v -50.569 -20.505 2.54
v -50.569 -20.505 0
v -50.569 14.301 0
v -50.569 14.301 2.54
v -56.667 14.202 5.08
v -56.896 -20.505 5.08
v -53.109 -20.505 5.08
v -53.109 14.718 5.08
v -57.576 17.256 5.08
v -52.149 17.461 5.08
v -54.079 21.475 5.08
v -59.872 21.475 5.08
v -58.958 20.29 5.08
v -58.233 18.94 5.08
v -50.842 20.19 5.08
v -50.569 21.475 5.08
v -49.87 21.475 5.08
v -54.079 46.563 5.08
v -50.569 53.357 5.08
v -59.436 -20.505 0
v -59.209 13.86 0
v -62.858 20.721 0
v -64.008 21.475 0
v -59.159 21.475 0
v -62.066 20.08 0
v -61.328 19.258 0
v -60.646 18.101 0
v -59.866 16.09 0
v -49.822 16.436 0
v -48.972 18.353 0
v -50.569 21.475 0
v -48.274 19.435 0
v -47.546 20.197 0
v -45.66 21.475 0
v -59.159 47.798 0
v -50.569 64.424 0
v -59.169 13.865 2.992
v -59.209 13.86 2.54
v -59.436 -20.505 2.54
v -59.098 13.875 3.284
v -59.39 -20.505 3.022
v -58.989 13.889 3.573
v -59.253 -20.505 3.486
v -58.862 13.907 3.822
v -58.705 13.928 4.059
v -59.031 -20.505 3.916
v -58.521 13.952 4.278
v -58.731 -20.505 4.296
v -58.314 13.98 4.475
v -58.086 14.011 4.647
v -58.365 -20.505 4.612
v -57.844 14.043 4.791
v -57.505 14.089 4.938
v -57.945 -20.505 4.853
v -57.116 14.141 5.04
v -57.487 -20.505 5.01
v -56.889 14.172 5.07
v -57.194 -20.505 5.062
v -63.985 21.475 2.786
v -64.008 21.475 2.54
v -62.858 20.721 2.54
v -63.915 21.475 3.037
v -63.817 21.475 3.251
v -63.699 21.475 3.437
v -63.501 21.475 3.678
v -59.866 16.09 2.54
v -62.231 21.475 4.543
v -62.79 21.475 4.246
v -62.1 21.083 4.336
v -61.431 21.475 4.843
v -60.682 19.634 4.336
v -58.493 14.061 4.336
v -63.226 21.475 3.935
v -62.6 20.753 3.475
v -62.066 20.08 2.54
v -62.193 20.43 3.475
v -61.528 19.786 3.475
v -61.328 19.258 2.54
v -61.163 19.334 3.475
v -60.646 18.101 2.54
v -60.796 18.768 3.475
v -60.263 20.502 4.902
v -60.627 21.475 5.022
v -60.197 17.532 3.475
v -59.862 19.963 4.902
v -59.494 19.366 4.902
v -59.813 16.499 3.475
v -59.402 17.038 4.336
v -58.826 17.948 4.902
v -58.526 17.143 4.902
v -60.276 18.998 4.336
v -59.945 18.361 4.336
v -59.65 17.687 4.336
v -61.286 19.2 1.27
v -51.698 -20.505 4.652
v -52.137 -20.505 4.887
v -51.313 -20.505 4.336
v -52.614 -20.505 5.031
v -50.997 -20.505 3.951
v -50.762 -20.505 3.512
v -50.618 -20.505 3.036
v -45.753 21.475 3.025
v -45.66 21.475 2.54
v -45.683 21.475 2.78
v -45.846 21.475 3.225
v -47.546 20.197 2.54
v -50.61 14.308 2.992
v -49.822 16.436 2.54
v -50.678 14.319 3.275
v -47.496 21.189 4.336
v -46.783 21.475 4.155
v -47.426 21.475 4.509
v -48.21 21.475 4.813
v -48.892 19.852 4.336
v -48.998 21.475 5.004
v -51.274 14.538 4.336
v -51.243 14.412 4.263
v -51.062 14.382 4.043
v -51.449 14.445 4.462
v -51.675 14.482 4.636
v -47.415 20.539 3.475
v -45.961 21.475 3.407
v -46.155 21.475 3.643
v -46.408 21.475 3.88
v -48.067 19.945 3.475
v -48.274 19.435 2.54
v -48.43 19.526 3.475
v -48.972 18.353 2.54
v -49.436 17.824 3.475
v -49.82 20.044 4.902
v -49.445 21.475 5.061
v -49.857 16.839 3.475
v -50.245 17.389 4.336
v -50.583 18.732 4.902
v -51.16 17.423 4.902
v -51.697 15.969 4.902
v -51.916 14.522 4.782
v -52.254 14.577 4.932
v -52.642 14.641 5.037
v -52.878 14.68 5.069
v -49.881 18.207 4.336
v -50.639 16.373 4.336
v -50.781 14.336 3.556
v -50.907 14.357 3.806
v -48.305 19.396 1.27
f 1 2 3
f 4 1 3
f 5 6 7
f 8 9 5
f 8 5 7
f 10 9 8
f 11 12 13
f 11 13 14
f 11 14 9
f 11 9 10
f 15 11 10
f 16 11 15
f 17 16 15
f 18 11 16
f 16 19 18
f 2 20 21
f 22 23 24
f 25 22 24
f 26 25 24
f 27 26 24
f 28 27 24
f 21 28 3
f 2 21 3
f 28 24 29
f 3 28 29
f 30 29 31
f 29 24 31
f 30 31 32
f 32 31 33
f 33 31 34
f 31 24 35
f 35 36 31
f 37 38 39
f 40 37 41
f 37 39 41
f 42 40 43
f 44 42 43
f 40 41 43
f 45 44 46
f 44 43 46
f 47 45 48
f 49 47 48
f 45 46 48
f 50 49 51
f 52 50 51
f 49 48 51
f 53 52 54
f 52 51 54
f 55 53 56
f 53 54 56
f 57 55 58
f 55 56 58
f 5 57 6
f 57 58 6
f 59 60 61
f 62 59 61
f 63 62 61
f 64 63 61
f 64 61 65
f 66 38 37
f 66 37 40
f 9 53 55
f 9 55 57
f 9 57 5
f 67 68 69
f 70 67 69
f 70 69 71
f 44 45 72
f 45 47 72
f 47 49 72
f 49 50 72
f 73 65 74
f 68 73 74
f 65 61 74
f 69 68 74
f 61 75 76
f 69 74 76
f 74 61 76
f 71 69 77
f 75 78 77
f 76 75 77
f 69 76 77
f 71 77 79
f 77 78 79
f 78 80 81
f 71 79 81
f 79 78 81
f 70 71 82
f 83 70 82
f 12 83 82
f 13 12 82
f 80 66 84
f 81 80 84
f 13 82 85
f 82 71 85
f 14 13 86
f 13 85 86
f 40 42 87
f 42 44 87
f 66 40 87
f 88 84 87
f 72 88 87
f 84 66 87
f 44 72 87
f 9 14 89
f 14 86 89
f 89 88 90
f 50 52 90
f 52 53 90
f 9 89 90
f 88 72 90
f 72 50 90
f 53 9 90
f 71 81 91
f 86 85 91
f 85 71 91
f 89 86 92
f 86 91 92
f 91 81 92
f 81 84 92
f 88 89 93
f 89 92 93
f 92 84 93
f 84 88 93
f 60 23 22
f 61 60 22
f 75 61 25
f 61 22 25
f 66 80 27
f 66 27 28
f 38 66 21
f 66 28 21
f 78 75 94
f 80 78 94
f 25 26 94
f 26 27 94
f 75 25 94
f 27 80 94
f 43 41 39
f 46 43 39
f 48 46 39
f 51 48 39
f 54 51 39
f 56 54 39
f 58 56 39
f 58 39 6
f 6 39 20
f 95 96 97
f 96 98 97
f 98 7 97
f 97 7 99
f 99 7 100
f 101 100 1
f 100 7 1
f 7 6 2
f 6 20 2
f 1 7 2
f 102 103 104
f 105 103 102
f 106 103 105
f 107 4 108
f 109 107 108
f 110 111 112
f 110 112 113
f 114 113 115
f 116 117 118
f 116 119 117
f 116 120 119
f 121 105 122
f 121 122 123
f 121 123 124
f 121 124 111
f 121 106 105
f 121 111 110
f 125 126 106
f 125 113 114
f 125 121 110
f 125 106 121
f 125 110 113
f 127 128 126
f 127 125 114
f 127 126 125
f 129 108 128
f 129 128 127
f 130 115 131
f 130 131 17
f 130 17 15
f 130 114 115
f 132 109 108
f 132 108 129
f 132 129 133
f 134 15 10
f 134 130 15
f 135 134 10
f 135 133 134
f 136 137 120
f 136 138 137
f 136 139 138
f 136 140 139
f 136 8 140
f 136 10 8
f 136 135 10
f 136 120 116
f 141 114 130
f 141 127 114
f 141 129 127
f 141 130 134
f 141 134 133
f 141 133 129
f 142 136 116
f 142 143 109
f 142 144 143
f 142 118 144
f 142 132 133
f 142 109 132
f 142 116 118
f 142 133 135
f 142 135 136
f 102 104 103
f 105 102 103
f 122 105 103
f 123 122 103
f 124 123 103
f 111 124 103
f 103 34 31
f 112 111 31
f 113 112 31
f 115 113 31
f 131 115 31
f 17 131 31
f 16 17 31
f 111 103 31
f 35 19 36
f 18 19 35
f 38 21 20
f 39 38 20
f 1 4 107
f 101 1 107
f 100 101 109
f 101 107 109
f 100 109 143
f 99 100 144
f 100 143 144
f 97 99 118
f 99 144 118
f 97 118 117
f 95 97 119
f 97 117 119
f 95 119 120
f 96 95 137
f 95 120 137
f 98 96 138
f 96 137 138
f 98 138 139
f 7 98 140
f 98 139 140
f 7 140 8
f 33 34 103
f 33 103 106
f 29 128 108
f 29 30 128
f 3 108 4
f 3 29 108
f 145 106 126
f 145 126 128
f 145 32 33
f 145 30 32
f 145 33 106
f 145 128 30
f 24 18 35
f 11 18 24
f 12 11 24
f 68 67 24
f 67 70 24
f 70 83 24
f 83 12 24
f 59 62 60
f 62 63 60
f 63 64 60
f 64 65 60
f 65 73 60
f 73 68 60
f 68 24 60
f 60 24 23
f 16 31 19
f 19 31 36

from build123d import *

# Parameters (mm, degrees)
F1_DEPTH = 5.08
F2_SIZE  = 5.07999
F3_R     = 2.54


# Not quite as in the source:
# - a fillet or chamfer is up to 0.001 mm smaller than in the source, because OpenCascade refuses the exact size


with BuildPart() as f1:
    # F0 (on Top) → F1 (new body)
    with BuildSketch(Plane.XY):
        Polygon((-50.5690909922, 21.4745439589), (-59.1589100659, 21.4745439589), (-59.2091714259, 13.8599455538), (-59.4360008836, -20.5047279596), (-50.5690909922, -20.5047279596), (-50.5690909922, 14.3012451008), align=None)
        with BuildLine():
            Line((-59.2091714259, 13.8599455538), (-59.1589100659, 21.4745439589))
            Line((-59.1589100659, 21.4745439589), (-64.0080049634, 21.4745439589))
            add(Edge.make_bspline(
                [(-64.0080049634, 21.4745439589), (-63.0207799447, 20.8576332232), (-60.7789769957, 19.4567445904), (-59.7724519982, 15.8681994581), (-59.2091714259, 13.8599455538)],
                knots=[0, 0, 0, 0, 0.4403710055, 1, 1, 1, 1], degree=3))
        make_face()
        Polygon((-59.1589100659, 47.79817909), (-59.1589100659, 21.4745439589), (-50.5690909922, 21.4745439589), (-50.5690909922, 64.423635602), align=None)
        with BuildLine():
            Line((-45.6602349877, 21.4745439589), (-50.5690909922, 21.4745439589))
            Line((-50.5690909922, 21.4745439589), (-50.5690909922, 14.3012451008))
            add(Edge.make_bspline(
                [(-45.6602349877, 21.4745439589), (-46.6065278441, 20.9184128466), (-48.770914008, 19.6464149903), (-49.9215342609, 16.2261394646), (-50.5690909922, 14.3012451008)],
                knots=[0, 0, 0, 0, 0.4372107307, 1, 1, 1, 1], degree=3))
        make_face()
    extrude(amount=F1_DEPTH)

    # F2 (size 5.08 in the source; OpenCascade refuses exactly that, so slightly less here)
    f2_edges = [f1.edges().sort_by_distance(p)[0] for p in [
        (-59.15891, 34.636362, 5.08),
        (-54.864001, 56.110907, 5.08),
    ]]
    chamfer(f2_edges, length=F2_SIZE)

    # F3
    f3_edges = [f1.edges().sort_by_distance(p)[0] for p in [
        (-59.322586, -3.322391, 5.08),
        (-50.569091, -3.101741, 5.08),
        (-60.725717, 18.263642, 5.08),
        (-48.908594, 18.46974, 5.08),
    ]]
    fillet(f3_edges, radius=F3_R)


solid = f1.part
